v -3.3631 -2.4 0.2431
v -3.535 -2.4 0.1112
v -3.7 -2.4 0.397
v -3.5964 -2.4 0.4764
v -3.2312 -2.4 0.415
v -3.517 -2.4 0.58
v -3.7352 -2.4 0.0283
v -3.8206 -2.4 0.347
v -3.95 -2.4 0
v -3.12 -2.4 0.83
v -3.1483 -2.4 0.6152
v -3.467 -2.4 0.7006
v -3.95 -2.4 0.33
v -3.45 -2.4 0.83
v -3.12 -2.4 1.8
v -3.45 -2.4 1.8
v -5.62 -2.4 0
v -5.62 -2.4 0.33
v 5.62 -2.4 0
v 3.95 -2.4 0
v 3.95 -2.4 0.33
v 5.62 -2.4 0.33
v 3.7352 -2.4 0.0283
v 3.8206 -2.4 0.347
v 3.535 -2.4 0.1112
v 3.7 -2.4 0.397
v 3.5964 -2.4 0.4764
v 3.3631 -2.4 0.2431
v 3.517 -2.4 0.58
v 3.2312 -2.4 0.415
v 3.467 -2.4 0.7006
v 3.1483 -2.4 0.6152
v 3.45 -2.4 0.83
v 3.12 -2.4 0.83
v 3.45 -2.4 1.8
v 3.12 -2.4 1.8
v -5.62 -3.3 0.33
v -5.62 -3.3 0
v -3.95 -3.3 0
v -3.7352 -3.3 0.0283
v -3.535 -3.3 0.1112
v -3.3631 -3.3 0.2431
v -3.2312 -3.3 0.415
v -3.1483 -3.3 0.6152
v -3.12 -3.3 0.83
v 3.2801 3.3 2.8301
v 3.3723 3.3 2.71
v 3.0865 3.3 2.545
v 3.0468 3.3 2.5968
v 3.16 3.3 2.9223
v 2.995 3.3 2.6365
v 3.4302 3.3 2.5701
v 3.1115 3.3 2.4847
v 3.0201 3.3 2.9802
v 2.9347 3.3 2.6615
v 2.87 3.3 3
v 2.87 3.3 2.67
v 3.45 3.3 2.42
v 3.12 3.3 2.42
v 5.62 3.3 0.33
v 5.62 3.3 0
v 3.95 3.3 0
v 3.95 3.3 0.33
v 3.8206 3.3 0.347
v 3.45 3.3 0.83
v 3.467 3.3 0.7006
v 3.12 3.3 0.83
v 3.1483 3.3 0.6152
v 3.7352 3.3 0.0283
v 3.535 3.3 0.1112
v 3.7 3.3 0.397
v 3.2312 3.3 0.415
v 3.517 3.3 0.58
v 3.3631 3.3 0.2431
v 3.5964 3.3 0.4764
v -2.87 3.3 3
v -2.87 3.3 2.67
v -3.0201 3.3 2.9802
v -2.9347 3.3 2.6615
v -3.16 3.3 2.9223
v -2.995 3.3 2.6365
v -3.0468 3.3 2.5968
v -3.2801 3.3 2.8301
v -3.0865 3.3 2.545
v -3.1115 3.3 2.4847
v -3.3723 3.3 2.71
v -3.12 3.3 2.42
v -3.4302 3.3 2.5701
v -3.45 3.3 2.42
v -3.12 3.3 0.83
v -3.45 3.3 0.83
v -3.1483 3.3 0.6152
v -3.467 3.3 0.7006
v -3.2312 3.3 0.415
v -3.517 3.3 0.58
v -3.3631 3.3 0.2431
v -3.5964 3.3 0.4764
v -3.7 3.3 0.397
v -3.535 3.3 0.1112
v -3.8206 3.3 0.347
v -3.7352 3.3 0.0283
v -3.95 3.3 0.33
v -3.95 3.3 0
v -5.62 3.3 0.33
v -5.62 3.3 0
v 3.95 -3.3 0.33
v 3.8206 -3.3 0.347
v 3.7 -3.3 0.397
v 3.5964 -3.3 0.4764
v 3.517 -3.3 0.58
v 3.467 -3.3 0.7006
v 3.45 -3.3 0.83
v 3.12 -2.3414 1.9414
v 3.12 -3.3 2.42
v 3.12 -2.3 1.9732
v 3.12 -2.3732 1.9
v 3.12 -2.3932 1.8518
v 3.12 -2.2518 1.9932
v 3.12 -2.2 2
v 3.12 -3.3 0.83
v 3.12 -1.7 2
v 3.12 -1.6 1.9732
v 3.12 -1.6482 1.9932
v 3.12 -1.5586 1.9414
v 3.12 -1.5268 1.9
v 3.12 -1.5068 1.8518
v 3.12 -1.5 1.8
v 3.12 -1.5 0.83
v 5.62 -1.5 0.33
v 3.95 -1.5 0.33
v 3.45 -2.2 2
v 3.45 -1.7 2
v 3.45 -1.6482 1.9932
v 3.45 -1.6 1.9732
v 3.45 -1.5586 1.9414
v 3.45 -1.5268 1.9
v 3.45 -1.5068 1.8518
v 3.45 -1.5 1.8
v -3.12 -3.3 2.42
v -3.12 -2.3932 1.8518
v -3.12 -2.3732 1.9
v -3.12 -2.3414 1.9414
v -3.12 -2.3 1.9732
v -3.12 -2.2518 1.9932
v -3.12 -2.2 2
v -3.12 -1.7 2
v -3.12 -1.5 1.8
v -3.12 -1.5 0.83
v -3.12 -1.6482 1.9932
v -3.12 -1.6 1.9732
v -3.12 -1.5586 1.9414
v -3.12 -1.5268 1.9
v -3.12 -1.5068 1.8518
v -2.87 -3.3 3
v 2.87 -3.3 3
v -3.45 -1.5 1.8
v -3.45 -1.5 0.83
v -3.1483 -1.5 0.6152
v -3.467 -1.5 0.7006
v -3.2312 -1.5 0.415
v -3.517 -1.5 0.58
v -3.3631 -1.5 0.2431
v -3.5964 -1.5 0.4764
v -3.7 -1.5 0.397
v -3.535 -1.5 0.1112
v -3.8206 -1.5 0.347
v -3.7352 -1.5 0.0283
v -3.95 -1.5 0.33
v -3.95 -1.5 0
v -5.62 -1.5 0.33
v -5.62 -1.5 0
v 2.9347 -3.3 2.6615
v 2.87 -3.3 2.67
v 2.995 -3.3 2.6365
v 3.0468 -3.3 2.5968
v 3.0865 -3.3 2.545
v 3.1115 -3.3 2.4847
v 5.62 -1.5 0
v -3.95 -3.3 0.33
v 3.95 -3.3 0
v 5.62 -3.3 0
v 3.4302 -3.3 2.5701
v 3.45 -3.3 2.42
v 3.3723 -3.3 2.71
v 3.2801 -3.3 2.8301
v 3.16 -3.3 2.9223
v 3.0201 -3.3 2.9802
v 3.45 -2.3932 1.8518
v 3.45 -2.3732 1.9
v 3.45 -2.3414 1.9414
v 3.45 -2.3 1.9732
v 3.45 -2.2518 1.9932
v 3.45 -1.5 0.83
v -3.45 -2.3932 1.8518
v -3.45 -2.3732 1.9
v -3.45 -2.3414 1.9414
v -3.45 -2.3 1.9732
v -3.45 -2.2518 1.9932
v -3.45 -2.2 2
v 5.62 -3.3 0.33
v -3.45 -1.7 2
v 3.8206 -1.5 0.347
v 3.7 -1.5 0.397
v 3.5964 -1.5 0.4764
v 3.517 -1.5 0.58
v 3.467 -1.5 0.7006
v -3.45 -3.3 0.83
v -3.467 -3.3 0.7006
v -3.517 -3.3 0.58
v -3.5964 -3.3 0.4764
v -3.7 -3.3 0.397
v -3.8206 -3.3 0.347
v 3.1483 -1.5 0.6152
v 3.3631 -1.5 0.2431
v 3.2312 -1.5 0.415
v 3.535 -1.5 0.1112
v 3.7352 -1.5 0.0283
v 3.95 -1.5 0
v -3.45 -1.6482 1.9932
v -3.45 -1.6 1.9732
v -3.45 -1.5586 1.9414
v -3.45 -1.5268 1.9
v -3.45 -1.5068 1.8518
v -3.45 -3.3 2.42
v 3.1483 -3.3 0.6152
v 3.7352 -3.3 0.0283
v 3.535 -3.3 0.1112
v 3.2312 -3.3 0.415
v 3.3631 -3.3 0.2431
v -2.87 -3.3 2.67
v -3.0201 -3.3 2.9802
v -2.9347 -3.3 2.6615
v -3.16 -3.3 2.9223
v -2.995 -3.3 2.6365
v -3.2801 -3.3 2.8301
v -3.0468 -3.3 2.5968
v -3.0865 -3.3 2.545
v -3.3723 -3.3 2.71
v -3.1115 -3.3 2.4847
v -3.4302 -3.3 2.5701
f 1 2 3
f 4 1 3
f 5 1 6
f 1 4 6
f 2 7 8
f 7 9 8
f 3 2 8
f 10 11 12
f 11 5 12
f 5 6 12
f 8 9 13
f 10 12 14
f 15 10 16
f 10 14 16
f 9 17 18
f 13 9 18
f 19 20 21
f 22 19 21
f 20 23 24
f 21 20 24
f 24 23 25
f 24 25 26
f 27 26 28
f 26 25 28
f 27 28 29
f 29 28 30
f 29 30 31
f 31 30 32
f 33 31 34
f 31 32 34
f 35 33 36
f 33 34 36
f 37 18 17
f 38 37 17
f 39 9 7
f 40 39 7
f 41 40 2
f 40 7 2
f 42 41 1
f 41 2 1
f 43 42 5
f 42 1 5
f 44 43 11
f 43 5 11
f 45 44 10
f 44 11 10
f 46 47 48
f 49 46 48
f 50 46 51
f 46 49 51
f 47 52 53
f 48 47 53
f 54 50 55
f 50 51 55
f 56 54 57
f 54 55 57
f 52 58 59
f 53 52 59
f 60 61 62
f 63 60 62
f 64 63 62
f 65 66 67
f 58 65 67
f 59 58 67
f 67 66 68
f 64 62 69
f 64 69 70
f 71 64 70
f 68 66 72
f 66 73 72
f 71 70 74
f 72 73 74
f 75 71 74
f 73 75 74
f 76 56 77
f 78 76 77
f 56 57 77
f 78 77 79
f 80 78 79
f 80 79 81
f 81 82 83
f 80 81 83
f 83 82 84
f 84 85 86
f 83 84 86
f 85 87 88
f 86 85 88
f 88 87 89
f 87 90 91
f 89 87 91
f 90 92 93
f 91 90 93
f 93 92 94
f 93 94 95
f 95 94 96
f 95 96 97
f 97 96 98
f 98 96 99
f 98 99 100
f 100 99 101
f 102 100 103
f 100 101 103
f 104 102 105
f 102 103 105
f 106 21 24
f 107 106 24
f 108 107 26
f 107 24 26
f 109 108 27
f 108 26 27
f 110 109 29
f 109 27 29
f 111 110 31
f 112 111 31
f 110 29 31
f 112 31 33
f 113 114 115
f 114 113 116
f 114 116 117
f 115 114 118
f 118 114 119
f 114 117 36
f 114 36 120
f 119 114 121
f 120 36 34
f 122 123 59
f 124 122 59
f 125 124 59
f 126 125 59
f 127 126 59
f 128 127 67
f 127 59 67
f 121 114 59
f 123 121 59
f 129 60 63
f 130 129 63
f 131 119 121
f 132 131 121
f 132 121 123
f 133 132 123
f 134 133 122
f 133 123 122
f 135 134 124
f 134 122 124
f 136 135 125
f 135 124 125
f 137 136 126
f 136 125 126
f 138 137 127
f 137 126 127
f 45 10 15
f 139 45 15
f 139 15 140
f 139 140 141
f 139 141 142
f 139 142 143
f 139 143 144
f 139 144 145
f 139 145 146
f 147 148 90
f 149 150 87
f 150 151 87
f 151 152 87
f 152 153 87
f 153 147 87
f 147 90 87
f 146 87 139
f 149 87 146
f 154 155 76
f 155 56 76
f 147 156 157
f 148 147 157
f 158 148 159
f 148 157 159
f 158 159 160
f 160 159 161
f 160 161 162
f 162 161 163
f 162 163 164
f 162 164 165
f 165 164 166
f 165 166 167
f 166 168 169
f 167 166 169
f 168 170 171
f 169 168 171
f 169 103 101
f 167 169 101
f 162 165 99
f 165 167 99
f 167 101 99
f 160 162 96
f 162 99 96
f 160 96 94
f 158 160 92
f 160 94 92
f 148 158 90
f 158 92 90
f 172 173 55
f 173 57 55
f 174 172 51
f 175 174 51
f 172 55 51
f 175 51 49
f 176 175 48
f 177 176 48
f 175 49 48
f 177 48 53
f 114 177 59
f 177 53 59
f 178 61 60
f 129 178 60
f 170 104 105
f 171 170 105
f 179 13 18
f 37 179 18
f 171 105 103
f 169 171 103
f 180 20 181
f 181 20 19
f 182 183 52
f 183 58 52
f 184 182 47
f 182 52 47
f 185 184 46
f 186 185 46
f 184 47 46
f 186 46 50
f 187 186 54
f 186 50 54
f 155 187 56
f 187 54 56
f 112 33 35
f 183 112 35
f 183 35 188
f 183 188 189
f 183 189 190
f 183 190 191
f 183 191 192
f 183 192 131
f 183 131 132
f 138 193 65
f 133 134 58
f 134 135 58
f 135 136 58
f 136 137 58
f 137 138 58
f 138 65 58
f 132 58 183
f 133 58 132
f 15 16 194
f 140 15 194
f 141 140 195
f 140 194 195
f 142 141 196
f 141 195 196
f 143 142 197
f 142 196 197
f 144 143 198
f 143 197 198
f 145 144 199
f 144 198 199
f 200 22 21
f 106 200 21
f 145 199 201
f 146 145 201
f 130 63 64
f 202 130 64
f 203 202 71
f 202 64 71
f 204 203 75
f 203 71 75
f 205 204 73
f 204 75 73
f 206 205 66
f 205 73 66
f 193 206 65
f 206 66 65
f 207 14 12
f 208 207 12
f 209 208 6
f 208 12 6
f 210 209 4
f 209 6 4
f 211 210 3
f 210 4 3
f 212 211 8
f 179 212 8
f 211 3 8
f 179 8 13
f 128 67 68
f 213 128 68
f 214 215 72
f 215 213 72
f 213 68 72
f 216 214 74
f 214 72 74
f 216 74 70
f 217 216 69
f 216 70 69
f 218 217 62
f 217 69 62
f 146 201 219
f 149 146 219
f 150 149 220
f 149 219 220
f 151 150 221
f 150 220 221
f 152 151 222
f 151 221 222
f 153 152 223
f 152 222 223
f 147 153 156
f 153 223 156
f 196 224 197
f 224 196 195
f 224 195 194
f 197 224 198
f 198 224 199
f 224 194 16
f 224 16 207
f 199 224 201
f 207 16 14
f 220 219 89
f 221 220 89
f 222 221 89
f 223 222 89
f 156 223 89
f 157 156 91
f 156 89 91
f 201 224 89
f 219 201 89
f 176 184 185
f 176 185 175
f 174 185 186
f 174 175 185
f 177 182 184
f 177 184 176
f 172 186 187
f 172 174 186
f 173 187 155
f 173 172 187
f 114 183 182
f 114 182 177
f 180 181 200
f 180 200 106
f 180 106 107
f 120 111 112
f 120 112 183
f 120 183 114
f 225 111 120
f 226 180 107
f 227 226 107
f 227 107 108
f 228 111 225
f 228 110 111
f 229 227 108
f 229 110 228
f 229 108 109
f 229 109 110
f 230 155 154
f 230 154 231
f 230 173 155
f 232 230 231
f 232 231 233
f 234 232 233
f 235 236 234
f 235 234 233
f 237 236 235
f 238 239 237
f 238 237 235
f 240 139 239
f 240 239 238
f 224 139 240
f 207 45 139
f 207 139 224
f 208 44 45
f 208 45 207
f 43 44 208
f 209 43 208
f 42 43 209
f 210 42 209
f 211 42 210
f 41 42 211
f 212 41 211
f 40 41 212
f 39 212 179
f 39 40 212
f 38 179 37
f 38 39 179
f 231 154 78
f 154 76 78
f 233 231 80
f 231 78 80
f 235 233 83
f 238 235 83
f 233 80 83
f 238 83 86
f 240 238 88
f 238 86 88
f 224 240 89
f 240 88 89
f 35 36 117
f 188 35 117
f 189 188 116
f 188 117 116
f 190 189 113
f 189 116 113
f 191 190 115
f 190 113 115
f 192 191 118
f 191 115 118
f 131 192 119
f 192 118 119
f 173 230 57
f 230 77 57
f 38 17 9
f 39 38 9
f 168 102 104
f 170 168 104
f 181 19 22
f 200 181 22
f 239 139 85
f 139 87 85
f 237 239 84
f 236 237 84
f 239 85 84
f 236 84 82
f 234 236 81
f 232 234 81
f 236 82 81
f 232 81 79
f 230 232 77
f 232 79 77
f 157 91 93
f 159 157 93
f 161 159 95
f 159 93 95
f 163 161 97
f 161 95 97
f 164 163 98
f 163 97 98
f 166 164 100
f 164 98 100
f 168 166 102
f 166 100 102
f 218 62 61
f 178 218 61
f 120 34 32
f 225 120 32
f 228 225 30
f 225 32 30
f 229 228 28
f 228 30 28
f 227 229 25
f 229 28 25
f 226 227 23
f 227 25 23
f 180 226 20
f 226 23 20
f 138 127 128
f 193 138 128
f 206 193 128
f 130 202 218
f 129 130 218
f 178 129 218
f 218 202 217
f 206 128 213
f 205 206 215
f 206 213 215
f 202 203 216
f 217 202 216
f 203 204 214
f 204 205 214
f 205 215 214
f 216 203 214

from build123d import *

# Parameters (mm, degrees)
EXTRUDE_1_DEPTH          = 3.3
CUT_EXTRUDE_1_DEPTH      = 8.174566189
CUT_EXTRUDE_1_DEPTH_BACK = 8.174566189


with BuildPart() as part:
    # Эскиз1 → Бобышка-Вытянуть1 (new, symmetric)
    with BuildSketch(Plane(origin=(0, 0, 0), x_dir=(1, 0, 0), z_dir=(0, 1, 0))):
        with BuildLine():
            Line((-5.62, 0), (-3.95, 0))
            ThreePointArc((-3.95, 0), (-3.363101372, -0.243101372), (-3.12, -0.83))
            Line((-3.12, -0.83), (-3.12, -2.42))
            ThreePointArc((-3.12, -2.42), (-3.046776695, -2.596776695), (-2.87, -2.67))
            Line((-2.87, -2.67), (2.87, -2.67))
            ThreePointArc((2.87, -2.67), (3.046776695, -2.596776695), (3.12, -2.42))
            Line((3.12, -2.42), (3.12, -0.83))
            ThreePointArc((3.12, -0.83), (3.363101372, -0.243101372), (3.95, 0))
            Line((3.95, 0), (5.62, 0))
            Line((5.62, 0), (5.62, -0.33))
            Line((5.62, -0.33), (3.95, -0.33))
            ThreePointArc((3.95, -0.33), (3.596446609, -0.476446609), (3.45, -0.83))
            Line((3.45, -0.83), (3.45, -2.42))
            ThreePointArc((3.45, -2.42), (3.280121933, -2.830121933), (2.87, -3))
            Line((2.87, -3), (-2.87, -3))
            ThreePointArc((-2.87, -3), (-3.280121933, -2.830121933), (-3.45, -2.42))
            Line((-3.45, -2.42), (-3.45, -0.83))
            ThreePointArc((-3.45, -0.83), (-3.596446609, -0.476446609), (-3.95, -0.33))
            Line((-3.95, -0.33), (-5.62, -0.33))
            Line((-5.62, -0.33), (-5.62, 0))
        make_face()
    extrude(amount=EXTRUDE_1_DEPTH, both=True)

    # Эскиз2 → Вырез-Вытянуть1 (cut, two sides: drawn at the far end of the back side and taken through both)
    with BuildSketch(Plane(origin=(0, 0, 0), x_dir=(0, 0, -1), z_dir=(1, 0, 0)).offset(-CUT_EXTRUDE_1_DEPTH_BACK)):
        with BuildLine():
            Line((0, -1.5), (0, -2.4))
            Line((0, -2.4), (-1.8, -2.4))
            ThreePointArc((-1.8, -2.4), (-1.941421356, -2.341421356), (-2, -2.2))
            Line((-2, -2.2), (-2, -1.7))
            ThreePointArc((-2, -1.7), (-1.941421356, -1.558578644), (-1.8, -1.5))
            Line((-1.8, -1.5), (0, -1.5))
        make_face()
    extrude(amount=CUT_EXTRUDE_1_DEPTH + CUT_EXTRUDE_1_DEPTH_BACK, mode=Mode.SUBTRACT)


solid = part.part
